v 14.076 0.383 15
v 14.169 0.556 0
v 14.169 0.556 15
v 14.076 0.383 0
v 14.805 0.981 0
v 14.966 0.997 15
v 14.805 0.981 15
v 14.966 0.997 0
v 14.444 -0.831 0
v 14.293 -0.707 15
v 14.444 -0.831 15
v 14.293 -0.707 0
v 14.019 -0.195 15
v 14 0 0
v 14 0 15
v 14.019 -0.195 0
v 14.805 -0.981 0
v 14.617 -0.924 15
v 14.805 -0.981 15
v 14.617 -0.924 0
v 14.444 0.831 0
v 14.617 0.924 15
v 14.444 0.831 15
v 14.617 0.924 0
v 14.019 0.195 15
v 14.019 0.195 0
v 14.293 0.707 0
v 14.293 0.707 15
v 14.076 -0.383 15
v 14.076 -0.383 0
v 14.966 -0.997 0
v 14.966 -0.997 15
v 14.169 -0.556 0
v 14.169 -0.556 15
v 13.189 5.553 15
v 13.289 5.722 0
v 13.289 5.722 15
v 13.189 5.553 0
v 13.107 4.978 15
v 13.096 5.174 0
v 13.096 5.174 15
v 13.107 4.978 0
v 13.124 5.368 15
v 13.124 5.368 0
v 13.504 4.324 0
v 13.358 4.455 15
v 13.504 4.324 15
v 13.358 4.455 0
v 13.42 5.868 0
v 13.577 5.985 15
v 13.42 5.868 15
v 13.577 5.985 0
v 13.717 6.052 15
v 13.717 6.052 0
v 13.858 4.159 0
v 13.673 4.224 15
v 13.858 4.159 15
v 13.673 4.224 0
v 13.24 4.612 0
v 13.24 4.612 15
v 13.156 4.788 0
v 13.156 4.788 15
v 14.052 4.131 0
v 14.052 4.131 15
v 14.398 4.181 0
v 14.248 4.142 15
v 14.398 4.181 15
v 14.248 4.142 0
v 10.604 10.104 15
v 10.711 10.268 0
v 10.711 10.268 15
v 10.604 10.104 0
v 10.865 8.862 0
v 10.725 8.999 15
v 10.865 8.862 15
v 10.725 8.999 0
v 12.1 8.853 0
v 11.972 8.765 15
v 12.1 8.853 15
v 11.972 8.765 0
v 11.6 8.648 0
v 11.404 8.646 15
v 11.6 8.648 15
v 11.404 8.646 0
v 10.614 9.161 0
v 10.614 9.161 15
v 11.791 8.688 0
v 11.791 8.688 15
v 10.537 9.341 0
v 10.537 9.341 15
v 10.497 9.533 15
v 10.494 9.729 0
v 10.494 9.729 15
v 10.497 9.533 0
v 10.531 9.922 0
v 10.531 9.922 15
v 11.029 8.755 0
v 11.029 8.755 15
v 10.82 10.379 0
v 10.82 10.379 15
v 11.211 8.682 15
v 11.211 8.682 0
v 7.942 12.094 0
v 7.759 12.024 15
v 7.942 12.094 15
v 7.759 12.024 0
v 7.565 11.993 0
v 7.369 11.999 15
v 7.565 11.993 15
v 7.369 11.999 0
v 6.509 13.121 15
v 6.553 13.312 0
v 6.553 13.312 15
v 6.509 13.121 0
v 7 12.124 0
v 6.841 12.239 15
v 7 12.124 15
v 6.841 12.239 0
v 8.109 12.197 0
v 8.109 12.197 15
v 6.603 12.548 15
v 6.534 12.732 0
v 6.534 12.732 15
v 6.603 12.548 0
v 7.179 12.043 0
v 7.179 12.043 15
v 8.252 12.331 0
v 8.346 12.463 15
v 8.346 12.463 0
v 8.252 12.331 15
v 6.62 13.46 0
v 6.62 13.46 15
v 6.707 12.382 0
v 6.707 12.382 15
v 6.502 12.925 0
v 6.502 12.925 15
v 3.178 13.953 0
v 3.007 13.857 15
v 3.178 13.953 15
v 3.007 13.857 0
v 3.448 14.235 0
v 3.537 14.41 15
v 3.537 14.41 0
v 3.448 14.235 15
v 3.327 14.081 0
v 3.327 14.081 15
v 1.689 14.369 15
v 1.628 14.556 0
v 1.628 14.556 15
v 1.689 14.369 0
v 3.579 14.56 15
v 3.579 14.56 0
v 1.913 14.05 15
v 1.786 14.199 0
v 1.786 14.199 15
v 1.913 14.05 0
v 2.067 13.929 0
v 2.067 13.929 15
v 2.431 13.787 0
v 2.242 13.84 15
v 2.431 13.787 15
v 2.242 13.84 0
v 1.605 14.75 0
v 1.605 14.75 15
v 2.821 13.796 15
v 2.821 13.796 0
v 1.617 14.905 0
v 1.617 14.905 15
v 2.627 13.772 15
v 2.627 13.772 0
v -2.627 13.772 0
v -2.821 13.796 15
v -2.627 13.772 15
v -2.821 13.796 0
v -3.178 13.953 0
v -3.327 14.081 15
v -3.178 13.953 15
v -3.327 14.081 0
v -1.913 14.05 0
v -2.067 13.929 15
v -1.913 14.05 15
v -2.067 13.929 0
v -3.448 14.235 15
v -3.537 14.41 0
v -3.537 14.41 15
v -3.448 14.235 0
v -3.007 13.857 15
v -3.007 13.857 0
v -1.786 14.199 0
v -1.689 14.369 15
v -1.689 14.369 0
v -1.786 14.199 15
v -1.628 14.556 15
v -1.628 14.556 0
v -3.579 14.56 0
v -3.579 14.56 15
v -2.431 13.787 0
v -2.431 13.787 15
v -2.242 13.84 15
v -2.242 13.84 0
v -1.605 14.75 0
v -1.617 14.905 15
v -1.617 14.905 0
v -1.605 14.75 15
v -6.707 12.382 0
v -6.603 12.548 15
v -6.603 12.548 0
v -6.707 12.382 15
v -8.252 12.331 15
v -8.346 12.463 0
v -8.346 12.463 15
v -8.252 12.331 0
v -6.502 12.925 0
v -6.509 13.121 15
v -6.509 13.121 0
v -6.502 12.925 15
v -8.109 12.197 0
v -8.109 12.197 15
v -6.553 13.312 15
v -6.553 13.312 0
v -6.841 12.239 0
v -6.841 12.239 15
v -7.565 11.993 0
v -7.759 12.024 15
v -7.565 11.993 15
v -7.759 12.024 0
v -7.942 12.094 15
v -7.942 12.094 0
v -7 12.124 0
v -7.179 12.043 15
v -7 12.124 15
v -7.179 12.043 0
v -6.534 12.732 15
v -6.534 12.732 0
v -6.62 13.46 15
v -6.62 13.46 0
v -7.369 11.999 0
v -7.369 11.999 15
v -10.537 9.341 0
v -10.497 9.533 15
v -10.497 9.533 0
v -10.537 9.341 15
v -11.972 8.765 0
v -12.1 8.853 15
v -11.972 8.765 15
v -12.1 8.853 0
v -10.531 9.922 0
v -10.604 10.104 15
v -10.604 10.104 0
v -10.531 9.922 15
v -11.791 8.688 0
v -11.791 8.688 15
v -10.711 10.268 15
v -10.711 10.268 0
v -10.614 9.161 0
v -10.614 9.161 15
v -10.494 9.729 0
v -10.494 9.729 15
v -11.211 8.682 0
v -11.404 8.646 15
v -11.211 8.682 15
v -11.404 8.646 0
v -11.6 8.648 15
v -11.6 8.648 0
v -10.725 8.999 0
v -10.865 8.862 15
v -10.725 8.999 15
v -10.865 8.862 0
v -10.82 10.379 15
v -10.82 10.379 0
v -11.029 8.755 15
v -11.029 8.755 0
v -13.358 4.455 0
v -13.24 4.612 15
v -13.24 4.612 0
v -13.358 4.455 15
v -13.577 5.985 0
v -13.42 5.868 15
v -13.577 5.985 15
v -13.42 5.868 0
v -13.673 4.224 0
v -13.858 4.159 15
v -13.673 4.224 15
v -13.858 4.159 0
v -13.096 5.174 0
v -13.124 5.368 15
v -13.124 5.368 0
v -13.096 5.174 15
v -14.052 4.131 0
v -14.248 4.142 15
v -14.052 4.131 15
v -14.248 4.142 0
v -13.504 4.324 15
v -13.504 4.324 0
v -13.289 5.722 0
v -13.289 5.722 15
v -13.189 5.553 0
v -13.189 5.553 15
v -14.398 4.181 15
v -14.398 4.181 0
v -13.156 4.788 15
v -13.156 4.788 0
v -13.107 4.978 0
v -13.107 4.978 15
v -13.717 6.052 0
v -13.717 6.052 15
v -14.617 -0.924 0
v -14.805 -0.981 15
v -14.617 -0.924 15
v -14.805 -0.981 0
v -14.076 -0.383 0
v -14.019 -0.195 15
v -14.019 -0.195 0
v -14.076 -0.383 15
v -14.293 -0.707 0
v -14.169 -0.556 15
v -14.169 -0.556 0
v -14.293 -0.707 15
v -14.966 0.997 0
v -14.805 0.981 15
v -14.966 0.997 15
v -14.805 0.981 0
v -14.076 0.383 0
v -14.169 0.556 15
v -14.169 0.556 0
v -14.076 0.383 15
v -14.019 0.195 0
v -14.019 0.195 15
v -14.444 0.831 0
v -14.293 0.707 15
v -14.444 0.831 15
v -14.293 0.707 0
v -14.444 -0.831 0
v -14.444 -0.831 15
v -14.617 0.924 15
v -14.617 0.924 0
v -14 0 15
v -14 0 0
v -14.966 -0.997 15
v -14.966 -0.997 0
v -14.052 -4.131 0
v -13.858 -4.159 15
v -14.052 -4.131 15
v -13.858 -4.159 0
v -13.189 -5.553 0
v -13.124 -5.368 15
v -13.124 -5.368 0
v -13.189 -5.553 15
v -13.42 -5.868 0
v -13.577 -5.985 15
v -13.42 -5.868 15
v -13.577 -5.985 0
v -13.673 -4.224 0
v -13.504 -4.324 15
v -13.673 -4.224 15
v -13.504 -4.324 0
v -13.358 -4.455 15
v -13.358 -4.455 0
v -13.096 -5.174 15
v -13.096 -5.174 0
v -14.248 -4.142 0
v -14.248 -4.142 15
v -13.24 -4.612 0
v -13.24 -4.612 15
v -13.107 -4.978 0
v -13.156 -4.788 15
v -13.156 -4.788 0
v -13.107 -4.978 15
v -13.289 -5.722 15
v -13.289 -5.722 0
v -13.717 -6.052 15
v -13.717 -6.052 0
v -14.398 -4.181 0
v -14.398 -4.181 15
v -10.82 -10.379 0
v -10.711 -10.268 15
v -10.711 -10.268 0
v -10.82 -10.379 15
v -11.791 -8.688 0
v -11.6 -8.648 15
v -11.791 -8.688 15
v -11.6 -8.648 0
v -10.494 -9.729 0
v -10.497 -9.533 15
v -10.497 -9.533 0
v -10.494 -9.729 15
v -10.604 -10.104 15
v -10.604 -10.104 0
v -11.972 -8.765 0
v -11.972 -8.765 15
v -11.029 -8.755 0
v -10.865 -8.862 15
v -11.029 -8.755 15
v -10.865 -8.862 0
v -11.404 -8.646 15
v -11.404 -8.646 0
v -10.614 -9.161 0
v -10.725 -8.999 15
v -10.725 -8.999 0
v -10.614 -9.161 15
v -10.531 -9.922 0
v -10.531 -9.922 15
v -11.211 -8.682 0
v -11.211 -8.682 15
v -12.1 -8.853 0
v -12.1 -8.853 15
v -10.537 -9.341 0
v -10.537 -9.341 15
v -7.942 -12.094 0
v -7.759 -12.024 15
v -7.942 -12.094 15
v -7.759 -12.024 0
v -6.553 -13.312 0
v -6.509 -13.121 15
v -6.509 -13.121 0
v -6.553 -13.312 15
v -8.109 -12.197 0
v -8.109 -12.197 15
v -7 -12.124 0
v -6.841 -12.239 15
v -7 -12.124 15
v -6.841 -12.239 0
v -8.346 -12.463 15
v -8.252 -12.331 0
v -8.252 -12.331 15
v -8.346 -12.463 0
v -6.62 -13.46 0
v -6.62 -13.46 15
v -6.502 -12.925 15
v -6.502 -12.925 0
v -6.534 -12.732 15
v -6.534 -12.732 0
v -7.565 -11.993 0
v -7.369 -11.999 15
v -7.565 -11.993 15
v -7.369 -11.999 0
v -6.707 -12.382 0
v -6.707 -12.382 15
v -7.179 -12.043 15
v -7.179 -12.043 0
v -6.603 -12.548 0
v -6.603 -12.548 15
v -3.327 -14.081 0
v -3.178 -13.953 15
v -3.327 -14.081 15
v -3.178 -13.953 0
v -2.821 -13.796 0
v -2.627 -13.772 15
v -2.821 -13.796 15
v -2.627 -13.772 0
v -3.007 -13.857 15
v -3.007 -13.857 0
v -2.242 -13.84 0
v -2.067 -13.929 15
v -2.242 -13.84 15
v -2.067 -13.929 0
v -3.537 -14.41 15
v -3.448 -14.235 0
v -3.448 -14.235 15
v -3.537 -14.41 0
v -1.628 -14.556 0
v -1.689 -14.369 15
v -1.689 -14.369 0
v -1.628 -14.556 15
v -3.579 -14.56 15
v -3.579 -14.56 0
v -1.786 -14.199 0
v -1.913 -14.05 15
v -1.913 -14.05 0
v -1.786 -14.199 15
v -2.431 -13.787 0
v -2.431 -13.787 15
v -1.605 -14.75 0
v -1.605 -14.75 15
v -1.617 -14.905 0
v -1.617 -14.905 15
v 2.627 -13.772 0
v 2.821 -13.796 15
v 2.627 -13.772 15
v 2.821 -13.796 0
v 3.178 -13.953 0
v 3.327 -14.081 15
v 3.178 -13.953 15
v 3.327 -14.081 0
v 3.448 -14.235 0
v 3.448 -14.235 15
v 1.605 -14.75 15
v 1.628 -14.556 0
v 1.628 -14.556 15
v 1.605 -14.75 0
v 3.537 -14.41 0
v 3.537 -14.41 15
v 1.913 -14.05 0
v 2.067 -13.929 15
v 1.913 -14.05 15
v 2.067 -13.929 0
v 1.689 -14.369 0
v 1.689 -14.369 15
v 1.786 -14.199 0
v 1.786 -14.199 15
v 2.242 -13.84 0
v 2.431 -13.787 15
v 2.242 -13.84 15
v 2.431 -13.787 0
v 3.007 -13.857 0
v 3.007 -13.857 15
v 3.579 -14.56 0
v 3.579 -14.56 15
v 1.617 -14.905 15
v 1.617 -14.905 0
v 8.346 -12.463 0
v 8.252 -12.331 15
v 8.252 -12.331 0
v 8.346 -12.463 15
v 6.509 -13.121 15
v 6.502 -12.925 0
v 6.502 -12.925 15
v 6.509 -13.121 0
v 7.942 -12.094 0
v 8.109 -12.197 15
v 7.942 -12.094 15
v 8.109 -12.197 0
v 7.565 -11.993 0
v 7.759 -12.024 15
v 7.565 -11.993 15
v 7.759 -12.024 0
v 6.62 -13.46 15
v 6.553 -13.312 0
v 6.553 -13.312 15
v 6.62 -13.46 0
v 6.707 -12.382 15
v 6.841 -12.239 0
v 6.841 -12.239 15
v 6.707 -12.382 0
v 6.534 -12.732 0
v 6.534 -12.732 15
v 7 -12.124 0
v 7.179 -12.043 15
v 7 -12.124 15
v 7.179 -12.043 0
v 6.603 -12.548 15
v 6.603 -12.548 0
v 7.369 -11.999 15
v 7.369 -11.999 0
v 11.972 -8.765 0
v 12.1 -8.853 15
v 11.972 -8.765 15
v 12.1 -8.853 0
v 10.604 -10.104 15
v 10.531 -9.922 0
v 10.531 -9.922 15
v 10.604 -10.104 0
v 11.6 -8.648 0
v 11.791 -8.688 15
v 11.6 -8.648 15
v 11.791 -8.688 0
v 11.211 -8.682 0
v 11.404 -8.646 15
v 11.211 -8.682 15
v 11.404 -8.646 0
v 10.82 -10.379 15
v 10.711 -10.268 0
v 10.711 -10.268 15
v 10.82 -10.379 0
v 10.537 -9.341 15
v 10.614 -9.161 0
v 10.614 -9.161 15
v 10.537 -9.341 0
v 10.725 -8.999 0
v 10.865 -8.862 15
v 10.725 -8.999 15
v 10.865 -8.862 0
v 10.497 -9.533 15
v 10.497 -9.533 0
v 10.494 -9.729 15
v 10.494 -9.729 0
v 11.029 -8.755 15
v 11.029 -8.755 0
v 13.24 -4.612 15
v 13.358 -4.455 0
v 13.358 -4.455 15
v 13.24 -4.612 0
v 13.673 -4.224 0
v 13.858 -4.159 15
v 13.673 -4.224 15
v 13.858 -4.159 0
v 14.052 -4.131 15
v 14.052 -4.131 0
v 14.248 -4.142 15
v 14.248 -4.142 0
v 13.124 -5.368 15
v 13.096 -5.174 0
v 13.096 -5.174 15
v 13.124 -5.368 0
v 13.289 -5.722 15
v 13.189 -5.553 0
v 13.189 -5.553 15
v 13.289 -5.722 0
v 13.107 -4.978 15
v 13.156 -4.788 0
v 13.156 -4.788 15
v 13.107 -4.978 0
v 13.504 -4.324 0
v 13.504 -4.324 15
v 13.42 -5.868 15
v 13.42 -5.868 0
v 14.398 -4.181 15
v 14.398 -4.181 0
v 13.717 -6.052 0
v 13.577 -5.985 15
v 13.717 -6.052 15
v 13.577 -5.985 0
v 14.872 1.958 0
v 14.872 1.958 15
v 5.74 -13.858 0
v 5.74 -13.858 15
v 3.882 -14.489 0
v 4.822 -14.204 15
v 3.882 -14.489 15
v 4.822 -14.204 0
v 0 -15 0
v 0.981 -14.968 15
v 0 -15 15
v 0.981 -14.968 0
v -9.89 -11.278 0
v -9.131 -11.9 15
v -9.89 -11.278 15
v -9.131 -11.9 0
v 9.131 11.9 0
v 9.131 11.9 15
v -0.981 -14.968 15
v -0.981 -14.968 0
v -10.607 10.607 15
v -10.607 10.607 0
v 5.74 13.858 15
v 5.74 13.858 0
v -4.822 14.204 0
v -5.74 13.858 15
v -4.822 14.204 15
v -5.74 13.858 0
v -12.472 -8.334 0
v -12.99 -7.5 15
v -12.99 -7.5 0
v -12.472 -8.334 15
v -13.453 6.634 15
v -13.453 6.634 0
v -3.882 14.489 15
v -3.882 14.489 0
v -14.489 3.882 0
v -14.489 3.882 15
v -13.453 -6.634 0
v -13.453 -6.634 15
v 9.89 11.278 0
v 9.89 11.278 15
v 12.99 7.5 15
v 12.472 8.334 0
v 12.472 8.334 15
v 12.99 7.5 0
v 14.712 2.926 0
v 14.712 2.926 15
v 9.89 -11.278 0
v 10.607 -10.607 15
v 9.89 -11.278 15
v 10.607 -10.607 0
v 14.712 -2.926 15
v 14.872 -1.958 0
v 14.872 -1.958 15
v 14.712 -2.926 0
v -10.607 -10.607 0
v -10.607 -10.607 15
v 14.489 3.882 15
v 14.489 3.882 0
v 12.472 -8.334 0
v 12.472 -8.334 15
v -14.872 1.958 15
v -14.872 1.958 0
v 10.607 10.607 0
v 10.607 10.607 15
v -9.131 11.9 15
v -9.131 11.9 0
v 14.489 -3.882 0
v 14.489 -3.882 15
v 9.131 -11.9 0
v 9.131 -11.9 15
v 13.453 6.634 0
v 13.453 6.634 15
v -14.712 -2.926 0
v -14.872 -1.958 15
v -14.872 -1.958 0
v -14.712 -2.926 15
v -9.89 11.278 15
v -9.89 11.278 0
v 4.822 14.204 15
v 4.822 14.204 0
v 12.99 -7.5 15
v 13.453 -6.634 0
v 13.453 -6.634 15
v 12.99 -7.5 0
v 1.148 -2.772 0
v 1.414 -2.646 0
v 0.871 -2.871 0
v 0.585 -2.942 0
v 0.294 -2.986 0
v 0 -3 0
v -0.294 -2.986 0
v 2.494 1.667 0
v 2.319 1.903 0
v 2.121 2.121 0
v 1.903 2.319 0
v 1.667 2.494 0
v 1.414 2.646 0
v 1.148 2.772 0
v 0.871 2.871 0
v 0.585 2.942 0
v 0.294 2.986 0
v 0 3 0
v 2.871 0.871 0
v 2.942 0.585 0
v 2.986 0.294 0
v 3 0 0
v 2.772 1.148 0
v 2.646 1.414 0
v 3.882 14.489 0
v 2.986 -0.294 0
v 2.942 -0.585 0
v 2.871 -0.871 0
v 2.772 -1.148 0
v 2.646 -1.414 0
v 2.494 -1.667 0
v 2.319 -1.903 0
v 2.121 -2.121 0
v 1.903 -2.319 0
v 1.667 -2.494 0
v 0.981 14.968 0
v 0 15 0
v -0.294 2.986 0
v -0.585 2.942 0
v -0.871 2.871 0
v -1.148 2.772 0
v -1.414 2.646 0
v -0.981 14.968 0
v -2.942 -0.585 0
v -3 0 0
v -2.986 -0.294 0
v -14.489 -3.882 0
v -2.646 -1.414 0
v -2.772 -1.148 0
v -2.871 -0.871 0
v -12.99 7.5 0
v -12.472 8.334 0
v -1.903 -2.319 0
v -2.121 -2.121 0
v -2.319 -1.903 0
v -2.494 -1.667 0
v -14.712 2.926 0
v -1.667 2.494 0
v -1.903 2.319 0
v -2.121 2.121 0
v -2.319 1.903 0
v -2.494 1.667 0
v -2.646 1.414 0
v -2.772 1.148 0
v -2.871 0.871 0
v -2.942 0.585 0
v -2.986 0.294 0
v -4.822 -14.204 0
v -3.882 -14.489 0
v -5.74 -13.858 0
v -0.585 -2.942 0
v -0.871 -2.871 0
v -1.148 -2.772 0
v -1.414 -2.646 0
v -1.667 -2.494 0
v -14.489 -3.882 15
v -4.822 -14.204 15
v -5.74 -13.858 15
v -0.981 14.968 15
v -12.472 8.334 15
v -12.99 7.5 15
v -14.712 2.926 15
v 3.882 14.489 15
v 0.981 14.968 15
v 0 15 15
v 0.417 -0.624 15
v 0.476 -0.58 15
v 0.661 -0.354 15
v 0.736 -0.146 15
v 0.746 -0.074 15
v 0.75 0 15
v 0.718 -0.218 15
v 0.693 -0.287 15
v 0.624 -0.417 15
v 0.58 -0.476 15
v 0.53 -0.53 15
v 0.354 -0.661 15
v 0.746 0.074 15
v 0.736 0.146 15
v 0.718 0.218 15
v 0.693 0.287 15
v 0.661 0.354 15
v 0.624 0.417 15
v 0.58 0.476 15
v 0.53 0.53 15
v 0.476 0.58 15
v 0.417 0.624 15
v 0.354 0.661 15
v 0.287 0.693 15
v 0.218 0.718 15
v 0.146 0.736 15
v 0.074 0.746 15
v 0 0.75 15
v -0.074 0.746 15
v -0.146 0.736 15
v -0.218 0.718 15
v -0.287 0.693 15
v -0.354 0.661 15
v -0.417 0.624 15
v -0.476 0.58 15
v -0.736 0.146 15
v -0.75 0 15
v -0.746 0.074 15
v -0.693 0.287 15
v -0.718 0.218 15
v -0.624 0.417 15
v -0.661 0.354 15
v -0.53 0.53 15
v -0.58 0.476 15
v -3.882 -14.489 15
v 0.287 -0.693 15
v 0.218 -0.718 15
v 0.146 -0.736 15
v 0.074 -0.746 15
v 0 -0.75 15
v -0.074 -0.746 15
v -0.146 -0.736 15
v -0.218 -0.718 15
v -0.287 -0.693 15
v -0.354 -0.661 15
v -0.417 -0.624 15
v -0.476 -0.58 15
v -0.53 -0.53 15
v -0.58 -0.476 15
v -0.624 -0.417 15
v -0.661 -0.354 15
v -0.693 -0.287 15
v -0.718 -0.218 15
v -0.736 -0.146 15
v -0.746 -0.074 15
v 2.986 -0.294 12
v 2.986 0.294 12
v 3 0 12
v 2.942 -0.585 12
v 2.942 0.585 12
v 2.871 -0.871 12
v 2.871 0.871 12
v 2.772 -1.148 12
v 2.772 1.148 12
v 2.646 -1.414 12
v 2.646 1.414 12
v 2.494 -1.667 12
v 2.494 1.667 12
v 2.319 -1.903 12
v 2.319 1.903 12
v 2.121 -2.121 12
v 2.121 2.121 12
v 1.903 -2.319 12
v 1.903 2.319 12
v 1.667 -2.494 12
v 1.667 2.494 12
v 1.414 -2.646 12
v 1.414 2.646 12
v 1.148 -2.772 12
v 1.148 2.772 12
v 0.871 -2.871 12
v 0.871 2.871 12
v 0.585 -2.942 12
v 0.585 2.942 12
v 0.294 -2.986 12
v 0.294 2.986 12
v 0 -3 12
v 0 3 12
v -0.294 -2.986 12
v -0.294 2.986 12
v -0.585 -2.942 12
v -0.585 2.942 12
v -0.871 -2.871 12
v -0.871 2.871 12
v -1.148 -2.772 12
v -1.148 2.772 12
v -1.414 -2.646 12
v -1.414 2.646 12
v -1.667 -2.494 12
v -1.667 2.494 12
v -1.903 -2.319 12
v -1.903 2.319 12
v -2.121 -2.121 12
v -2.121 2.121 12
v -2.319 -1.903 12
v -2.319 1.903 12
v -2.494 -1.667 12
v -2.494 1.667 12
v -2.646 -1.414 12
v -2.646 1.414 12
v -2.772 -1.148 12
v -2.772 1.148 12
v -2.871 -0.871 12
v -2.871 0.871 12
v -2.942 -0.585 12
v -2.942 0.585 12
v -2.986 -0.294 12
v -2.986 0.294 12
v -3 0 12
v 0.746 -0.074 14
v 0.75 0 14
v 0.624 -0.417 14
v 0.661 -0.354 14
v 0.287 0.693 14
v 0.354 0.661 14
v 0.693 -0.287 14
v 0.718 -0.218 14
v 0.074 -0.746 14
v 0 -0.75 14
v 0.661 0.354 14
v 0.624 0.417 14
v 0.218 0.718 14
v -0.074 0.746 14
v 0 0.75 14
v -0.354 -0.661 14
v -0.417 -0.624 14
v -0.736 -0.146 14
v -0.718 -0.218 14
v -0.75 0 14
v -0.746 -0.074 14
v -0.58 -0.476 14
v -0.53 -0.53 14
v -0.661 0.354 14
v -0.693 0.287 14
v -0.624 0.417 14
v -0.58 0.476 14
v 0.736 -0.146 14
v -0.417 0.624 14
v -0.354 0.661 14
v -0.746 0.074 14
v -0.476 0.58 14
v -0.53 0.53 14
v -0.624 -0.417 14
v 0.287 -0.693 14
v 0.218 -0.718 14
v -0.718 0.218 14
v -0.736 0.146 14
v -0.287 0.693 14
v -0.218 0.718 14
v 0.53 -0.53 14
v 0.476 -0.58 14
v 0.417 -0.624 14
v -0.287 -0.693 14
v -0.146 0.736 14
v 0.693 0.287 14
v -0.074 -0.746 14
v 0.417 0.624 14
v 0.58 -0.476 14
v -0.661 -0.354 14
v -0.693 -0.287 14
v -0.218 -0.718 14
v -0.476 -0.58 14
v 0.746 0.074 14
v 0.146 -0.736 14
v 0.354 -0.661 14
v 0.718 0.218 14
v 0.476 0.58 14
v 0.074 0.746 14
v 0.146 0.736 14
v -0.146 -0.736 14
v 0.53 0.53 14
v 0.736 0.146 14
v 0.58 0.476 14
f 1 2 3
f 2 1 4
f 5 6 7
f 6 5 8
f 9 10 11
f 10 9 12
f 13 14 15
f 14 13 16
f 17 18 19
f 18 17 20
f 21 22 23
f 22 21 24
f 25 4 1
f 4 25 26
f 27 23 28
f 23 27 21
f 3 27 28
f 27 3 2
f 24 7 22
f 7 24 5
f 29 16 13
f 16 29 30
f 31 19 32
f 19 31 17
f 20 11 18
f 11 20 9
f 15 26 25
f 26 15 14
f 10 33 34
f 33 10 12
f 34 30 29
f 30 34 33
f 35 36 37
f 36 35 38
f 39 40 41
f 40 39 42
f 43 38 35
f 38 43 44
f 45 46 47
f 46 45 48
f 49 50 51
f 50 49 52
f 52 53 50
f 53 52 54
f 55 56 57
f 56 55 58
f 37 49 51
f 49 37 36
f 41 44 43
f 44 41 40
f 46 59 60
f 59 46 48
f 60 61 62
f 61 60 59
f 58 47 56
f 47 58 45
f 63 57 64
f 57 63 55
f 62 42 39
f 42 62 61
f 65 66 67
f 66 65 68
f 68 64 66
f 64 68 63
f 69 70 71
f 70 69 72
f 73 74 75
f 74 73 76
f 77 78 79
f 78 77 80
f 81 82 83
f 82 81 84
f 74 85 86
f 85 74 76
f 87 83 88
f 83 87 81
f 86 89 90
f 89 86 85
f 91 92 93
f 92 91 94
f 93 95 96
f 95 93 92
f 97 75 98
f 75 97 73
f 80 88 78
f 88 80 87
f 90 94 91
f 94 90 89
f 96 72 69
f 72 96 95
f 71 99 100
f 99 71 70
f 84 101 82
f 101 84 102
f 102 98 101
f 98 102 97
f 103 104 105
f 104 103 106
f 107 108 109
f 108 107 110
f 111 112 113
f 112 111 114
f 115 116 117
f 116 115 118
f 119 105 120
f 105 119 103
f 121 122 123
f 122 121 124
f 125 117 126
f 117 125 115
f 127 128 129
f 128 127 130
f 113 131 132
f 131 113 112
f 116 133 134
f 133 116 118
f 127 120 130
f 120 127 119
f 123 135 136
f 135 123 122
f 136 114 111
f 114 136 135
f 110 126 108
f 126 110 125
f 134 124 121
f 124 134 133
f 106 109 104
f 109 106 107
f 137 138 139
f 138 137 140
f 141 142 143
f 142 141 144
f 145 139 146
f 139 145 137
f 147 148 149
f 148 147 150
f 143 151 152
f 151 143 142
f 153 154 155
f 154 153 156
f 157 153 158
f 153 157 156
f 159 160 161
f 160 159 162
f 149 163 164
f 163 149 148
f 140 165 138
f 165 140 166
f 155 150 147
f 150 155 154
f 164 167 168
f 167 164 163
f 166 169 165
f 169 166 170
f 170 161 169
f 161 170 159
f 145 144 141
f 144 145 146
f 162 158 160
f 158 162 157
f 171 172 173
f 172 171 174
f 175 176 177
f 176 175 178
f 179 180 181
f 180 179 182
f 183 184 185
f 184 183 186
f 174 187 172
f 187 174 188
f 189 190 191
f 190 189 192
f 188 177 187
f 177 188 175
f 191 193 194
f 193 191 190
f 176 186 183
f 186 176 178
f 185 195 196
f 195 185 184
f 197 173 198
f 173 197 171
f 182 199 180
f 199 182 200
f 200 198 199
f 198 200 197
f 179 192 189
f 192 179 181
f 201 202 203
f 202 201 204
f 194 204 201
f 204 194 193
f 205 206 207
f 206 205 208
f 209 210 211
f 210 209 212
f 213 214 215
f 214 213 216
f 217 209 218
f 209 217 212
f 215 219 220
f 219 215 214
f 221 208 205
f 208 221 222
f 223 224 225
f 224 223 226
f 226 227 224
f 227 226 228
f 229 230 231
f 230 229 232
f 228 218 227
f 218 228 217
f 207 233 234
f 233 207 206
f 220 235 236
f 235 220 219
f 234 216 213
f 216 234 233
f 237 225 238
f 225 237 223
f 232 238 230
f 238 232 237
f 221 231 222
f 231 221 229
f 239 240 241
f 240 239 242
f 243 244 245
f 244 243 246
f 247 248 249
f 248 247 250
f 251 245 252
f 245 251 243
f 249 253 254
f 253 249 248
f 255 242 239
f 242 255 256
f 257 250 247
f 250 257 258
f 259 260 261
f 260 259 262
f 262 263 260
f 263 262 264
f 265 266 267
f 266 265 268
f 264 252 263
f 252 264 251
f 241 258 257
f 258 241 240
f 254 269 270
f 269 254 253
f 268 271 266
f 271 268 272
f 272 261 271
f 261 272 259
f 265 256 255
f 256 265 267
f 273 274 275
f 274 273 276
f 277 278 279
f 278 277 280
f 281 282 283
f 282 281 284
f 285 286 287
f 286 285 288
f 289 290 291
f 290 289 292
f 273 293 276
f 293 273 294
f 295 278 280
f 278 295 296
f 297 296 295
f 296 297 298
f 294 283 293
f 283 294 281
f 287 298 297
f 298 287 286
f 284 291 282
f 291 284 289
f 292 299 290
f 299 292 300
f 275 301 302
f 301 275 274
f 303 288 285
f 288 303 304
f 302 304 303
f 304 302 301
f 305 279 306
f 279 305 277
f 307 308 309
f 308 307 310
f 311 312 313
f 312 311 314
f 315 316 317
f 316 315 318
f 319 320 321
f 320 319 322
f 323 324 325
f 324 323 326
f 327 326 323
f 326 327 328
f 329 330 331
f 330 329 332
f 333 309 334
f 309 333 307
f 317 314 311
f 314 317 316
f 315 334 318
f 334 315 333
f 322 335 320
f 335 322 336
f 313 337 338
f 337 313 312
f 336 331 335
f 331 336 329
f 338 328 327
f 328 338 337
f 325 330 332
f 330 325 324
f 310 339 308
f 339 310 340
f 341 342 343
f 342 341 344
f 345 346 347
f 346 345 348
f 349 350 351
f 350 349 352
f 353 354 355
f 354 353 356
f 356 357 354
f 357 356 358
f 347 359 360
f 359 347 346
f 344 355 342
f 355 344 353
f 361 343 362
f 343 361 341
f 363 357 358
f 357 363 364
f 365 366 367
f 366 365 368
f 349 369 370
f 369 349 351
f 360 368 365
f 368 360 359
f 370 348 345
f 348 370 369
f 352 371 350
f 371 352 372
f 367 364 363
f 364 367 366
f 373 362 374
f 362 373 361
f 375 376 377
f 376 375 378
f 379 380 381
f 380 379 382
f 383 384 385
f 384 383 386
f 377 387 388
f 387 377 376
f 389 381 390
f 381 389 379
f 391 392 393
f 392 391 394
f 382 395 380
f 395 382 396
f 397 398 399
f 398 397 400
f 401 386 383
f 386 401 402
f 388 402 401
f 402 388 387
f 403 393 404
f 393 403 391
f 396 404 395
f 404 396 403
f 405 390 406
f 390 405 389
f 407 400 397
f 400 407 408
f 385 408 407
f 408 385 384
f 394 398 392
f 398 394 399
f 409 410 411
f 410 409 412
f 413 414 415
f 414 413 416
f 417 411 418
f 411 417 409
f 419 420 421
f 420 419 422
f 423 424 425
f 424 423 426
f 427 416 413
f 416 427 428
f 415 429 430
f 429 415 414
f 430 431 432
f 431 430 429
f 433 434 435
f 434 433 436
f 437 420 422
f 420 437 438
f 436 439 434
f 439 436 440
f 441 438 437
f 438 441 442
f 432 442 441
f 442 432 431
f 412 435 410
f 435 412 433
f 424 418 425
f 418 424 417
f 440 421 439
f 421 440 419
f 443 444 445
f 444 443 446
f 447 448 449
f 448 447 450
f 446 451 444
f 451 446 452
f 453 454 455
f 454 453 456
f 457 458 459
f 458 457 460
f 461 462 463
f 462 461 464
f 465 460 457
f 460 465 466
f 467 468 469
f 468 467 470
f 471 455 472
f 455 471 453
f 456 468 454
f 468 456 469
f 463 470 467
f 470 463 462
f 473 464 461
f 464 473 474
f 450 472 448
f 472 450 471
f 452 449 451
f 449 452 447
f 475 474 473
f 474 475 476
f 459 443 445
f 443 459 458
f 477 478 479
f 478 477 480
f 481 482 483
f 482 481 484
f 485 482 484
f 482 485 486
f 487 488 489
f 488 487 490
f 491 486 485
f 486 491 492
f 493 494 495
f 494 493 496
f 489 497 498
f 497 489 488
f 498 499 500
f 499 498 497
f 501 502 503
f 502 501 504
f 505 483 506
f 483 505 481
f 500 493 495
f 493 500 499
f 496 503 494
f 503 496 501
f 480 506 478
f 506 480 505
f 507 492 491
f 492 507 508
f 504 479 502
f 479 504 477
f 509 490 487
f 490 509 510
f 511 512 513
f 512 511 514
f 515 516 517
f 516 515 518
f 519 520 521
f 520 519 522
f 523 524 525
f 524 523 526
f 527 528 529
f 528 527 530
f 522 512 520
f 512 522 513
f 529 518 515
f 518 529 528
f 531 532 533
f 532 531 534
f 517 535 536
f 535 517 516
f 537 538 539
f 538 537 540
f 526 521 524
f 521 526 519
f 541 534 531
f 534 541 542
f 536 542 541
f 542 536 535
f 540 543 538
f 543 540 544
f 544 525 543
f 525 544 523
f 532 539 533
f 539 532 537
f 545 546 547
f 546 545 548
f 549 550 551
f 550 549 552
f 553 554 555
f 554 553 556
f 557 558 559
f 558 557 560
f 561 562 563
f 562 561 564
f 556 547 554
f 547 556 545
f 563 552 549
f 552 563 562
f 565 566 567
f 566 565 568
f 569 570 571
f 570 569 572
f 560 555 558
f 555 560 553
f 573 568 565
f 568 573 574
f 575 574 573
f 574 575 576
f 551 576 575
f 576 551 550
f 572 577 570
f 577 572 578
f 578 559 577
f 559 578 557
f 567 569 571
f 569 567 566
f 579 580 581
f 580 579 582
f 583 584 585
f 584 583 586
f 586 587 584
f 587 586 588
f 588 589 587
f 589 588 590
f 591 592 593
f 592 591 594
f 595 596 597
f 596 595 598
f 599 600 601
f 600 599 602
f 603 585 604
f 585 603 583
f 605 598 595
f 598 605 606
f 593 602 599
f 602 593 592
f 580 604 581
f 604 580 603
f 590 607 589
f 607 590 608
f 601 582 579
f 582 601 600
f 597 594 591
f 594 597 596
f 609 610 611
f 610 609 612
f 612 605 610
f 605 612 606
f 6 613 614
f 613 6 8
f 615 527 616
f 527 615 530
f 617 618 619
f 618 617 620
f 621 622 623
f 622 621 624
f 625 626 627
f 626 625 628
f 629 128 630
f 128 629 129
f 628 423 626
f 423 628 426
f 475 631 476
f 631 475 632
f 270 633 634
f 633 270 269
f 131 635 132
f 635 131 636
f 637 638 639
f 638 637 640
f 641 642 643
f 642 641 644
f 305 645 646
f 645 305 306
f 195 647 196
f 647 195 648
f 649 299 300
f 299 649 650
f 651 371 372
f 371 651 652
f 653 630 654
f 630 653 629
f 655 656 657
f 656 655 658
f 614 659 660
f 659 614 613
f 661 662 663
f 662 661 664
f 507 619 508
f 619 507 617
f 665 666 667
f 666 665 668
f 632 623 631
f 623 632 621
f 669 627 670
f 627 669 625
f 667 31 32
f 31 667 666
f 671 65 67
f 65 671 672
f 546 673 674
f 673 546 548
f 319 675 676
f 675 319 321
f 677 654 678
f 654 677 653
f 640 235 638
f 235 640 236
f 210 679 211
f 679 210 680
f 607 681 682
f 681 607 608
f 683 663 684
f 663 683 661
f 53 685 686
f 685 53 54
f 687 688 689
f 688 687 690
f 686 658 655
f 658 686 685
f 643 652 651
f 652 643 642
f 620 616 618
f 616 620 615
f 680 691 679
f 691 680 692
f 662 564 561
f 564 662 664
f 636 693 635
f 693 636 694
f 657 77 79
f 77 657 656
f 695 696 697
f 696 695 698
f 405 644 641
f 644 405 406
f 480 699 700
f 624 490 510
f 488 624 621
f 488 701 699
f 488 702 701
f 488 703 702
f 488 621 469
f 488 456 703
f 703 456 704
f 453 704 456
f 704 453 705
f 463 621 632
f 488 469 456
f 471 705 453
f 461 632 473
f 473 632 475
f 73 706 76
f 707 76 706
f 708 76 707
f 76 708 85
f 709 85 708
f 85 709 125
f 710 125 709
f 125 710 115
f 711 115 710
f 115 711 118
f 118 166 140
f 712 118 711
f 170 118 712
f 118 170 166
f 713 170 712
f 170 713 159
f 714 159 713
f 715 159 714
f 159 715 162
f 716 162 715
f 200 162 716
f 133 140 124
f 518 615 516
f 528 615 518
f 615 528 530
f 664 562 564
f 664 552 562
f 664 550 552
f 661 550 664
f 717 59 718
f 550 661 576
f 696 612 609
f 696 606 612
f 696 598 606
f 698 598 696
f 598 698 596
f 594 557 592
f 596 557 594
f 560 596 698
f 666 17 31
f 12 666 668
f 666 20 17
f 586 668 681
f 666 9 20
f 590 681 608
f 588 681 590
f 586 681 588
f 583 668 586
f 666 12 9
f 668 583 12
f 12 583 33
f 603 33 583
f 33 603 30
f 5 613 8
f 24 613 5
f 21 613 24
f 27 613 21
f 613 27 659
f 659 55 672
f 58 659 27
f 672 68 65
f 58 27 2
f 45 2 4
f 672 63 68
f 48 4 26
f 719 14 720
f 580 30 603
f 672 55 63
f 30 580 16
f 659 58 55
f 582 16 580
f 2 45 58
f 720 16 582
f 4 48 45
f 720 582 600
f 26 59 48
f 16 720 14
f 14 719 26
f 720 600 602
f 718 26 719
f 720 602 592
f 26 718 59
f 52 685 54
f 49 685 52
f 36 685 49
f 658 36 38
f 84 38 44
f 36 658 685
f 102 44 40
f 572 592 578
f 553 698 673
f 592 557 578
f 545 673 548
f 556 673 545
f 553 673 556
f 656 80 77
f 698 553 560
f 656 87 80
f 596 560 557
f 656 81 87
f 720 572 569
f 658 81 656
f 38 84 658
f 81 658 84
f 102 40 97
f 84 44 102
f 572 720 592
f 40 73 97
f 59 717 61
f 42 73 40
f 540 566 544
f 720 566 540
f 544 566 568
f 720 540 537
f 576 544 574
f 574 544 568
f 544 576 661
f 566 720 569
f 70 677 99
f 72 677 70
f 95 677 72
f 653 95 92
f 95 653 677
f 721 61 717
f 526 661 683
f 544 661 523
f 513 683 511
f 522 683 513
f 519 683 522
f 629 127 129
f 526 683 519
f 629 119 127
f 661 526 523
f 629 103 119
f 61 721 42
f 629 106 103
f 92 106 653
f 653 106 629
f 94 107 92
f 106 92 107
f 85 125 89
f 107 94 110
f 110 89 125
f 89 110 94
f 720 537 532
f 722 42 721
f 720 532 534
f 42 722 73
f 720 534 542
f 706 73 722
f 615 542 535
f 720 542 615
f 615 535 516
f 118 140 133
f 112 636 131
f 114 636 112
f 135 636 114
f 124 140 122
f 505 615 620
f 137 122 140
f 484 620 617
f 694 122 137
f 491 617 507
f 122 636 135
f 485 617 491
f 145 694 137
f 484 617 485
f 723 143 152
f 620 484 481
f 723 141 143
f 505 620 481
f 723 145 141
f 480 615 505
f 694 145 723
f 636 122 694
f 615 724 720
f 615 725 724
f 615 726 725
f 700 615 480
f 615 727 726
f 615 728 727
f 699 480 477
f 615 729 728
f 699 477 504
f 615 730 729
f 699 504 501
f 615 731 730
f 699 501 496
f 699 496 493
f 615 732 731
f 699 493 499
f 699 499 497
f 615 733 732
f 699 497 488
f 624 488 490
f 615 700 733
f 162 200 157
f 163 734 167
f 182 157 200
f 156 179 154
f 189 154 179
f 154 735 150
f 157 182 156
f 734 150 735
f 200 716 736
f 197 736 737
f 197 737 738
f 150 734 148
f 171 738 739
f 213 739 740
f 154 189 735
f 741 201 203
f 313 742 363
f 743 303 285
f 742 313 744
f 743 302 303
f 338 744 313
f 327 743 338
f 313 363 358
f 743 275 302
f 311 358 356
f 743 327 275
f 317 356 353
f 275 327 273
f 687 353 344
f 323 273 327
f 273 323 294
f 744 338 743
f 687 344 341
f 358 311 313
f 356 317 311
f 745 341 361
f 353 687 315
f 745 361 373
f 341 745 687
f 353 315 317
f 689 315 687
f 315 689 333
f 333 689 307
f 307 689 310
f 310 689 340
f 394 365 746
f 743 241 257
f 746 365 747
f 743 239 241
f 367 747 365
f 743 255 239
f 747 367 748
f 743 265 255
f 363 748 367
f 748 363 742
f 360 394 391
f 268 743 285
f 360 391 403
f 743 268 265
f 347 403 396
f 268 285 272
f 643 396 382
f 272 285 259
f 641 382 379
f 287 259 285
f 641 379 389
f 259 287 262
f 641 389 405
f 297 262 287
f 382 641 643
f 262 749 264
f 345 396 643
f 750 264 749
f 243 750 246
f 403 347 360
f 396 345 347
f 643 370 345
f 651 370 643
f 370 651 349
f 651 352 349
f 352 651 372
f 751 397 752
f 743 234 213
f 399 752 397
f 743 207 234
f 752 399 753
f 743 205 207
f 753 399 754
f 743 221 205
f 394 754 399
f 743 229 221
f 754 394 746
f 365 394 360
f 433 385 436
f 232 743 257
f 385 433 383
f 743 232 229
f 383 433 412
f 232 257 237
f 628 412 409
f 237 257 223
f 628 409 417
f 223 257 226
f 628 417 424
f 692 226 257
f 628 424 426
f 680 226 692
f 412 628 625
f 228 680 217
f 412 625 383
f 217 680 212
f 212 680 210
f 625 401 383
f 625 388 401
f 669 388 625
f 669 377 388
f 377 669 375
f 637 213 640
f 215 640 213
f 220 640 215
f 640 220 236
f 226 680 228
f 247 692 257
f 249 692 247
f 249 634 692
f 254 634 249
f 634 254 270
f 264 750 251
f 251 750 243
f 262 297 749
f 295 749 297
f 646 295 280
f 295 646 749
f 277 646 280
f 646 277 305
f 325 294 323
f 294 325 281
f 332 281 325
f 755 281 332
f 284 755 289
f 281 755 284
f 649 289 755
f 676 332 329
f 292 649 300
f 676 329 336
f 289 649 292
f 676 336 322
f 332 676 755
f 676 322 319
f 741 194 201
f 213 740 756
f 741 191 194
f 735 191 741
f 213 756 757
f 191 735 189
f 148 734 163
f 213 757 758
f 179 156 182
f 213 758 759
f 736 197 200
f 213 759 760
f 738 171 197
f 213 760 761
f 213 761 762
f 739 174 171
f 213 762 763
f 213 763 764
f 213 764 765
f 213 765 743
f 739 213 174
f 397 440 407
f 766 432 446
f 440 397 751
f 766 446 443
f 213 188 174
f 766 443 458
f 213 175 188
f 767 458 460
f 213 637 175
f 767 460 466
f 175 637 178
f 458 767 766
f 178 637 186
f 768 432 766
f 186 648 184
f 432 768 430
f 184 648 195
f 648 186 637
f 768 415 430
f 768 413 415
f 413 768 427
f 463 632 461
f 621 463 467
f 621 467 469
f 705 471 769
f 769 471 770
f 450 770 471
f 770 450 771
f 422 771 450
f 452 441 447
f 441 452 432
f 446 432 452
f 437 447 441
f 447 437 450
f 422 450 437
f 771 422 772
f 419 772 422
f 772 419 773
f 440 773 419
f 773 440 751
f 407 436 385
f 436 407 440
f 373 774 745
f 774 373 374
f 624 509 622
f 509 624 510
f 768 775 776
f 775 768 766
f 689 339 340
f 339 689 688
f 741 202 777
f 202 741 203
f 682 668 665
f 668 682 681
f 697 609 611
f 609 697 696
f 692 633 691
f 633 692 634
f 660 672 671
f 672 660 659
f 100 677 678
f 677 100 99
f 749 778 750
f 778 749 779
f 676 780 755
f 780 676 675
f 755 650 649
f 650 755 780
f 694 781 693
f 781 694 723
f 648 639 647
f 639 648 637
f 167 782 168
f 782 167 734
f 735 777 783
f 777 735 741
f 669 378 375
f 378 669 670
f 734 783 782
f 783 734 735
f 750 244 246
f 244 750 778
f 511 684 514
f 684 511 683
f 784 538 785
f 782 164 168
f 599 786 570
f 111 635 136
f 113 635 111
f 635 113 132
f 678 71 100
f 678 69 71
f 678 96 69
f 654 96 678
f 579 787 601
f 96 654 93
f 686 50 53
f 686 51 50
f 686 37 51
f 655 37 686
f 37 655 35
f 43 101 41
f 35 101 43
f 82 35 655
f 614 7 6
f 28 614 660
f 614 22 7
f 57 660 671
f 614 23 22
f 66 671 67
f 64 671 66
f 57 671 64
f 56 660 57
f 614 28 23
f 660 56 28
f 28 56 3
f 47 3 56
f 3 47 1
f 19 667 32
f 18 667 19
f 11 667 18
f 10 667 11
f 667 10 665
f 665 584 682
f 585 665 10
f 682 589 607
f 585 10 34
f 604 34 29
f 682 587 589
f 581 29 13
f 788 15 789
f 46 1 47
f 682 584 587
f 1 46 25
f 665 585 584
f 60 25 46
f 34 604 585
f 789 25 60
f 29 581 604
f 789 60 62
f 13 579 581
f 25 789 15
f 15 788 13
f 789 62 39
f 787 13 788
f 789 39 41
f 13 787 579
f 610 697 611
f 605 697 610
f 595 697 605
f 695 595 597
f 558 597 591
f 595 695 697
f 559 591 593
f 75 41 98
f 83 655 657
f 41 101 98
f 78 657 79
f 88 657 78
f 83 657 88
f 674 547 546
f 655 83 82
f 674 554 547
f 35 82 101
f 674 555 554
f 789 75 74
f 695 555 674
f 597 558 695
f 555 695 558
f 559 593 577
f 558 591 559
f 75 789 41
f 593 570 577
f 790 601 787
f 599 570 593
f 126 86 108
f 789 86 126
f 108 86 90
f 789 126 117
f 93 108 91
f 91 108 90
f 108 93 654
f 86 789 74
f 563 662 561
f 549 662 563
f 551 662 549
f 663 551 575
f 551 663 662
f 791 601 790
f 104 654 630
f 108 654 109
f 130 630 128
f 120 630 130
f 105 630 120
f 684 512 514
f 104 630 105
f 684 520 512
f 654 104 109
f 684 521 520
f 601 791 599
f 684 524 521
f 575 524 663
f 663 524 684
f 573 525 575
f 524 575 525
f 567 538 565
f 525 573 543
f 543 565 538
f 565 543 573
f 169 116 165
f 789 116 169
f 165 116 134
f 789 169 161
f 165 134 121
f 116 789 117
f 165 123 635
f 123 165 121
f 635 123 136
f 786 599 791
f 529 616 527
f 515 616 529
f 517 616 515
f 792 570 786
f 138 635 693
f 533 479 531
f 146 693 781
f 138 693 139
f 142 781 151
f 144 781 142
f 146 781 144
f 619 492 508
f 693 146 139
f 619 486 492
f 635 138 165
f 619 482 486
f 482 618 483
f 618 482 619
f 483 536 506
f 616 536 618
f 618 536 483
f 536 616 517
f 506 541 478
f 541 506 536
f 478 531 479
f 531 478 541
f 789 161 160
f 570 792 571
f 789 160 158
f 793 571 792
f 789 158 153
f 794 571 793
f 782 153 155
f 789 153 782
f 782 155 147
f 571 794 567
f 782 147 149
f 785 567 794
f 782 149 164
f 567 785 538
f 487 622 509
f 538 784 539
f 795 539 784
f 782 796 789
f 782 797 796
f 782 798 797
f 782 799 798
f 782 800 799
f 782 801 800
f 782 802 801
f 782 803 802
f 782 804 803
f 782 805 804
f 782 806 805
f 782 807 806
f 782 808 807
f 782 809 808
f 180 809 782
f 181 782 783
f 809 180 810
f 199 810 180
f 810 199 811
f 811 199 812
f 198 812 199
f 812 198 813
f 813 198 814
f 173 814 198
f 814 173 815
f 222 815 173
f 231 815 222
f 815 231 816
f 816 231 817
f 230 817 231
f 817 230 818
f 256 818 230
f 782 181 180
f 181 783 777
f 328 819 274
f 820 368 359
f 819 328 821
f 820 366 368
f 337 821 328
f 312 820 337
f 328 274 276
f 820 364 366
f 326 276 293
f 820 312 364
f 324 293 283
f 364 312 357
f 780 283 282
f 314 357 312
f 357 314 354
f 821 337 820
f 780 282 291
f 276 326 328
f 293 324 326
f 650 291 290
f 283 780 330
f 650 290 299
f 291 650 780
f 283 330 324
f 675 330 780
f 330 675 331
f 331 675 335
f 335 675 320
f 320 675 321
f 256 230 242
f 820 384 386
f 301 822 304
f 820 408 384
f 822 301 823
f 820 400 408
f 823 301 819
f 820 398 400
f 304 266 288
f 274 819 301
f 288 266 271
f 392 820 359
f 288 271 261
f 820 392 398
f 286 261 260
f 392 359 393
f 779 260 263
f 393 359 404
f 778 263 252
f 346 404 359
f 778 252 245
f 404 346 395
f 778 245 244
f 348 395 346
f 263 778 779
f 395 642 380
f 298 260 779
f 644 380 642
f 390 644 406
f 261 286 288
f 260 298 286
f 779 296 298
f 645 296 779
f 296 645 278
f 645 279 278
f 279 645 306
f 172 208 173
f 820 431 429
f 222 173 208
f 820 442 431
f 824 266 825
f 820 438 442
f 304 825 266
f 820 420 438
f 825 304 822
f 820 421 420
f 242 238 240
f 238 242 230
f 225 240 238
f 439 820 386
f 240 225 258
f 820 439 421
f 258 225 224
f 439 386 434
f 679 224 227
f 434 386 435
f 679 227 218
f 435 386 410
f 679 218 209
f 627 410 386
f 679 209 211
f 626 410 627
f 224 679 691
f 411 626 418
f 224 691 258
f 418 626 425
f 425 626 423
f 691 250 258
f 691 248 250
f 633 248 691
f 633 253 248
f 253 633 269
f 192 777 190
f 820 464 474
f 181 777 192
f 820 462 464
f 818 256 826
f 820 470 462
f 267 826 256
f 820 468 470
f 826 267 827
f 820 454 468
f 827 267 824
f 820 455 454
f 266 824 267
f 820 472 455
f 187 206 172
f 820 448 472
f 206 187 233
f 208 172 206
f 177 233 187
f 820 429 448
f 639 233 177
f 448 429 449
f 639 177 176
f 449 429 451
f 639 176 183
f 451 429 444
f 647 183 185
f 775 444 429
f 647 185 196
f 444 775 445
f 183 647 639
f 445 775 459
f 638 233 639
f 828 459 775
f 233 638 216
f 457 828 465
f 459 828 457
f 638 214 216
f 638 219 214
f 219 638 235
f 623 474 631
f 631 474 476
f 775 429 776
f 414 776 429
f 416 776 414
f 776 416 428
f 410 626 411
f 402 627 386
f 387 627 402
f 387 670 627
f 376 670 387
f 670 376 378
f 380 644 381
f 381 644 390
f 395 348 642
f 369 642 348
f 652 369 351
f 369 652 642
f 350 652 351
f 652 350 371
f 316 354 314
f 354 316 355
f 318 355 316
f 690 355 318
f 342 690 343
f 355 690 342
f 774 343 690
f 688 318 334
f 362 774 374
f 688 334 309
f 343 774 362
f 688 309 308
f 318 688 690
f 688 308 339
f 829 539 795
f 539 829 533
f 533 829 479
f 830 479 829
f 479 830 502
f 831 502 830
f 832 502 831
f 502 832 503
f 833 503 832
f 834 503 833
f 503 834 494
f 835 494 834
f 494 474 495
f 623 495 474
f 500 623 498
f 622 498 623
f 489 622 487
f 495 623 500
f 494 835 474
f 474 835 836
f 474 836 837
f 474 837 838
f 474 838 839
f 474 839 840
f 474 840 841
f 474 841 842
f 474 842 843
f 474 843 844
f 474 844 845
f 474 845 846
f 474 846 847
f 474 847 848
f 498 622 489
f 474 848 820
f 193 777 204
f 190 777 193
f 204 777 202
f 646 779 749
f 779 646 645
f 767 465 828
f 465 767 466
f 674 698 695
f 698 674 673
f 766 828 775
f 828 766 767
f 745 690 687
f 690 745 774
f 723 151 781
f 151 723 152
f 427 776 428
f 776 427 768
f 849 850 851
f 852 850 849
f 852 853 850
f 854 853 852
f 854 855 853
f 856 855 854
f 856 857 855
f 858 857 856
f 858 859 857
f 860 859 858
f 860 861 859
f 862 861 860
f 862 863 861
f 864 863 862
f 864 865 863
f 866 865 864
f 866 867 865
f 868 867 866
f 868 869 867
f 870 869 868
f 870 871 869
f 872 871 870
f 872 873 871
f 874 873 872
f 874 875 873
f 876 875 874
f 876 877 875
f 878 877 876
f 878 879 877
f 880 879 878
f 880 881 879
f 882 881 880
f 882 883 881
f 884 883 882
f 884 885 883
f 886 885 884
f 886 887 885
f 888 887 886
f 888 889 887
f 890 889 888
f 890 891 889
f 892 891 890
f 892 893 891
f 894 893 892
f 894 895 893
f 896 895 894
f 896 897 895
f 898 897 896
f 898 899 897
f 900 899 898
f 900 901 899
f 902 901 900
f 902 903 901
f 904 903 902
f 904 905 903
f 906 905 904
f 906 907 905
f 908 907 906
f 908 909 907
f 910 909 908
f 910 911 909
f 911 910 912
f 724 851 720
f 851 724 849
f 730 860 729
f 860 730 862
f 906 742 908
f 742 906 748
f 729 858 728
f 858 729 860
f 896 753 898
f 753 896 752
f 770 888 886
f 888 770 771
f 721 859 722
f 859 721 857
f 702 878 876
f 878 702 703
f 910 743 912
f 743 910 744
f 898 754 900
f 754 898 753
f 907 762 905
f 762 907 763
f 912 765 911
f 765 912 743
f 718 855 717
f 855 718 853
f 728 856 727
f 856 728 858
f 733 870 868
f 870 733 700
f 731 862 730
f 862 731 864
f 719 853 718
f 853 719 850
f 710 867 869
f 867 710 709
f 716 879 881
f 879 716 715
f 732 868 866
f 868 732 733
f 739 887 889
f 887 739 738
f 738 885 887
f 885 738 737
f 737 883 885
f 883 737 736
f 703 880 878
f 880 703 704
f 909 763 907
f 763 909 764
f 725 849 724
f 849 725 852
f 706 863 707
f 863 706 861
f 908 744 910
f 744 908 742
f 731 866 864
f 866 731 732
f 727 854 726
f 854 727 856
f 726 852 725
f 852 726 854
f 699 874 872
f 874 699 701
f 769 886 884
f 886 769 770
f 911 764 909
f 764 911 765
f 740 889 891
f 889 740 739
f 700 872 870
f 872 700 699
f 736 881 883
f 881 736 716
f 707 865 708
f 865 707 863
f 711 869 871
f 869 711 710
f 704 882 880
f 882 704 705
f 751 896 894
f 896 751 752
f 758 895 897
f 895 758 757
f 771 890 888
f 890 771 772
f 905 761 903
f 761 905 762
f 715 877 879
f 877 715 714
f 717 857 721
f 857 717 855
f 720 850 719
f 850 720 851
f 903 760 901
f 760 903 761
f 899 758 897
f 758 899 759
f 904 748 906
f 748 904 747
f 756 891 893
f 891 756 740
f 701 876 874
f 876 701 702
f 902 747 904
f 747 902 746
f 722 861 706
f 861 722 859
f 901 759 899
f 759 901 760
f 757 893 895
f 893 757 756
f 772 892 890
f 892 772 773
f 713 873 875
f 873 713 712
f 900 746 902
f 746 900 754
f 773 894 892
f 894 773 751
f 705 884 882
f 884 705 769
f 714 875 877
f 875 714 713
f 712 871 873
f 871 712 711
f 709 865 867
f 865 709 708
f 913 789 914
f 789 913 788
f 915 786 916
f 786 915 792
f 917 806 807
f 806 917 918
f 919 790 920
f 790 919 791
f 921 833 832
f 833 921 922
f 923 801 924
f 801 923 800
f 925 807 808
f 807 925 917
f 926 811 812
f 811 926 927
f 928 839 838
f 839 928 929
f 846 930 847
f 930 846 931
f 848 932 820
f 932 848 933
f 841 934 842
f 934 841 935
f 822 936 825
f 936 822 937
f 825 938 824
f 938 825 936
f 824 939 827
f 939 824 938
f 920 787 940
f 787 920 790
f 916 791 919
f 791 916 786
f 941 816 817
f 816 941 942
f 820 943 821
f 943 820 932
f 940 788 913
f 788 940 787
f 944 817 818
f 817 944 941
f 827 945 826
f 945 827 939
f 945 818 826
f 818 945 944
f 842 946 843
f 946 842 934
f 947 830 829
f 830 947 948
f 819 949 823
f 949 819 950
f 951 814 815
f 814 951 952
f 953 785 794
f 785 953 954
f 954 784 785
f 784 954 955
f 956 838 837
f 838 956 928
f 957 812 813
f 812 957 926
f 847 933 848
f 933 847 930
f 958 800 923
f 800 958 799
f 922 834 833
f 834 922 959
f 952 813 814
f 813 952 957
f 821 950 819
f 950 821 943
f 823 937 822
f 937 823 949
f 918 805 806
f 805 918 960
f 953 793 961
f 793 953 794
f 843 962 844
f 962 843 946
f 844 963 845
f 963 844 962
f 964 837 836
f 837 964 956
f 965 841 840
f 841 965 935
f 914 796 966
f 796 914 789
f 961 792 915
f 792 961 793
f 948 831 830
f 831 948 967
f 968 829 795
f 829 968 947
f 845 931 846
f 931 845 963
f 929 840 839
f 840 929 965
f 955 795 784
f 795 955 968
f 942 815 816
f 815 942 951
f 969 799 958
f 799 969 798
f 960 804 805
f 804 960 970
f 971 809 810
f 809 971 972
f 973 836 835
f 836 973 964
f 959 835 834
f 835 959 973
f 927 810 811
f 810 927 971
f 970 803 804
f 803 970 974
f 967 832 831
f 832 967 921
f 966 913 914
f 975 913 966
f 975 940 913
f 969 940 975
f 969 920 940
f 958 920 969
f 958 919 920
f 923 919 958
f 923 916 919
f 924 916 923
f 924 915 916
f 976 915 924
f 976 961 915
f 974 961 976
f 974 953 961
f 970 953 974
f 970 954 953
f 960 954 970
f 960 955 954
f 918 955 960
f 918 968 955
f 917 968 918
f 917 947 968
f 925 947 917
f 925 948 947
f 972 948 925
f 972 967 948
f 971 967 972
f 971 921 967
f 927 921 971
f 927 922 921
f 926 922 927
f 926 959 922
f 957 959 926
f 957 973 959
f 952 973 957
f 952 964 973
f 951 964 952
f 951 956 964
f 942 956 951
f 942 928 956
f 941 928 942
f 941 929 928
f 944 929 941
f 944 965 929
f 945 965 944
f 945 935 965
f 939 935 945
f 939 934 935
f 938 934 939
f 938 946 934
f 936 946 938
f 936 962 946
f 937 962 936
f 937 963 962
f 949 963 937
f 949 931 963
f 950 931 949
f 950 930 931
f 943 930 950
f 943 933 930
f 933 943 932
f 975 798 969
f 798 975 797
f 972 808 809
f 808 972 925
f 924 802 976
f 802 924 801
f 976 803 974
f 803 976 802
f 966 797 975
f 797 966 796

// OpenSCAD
// Replacement knob for hotplate stirrer with D-shaft
// Print orientation: bottom face (shaft bore) on bed at z = 0

// ---- Dimensions (mm) ----
knob_d        = 30;    // knob outer diameter
knob_h        = 15;    // knob height
shaft_d       = 6;     // D-shaft diameter
bore_depth    = 12;    // blind bore depth from bottom face
groove_count  = 18;    // number of grip grooves
groove_d      = 2;     // grip groove diameter
pointer_w     = 1.5;   // pointer groove width
pointer_d     = 1;     // pointer groove depth
eps           = 0.5;   // cutter overshoot past faces

$fn = 96;

difference() {
    // Main body
    cylinder(d = knob_d, h = knob_h);

    // D-shaped blind bore from bottom face
    translate([0, 0, -eps])
        cylinder(h = bore_depth + eps, $fn = 64);

    // D-flat cutter: circle with one side cut flat (distance flat-opposite = 4.7)
    translate([0, 0, -eps])
        linear_extrude(height = bore_depth + eps)
            circle(d = shaft_d, $fn = 64);

    // Grip grooves: 18 evenly spaced vertical half-cylinders on outer surface
    for (i = [0 : groove_count - 1])
        rotate([0, 0, i * 360 / groove_count])
            translate([knob_d / 2, 0, -eps])
                cylinder(d = groove_d, h = knob_h + 2 * eps, $fn = 32);

    // Pointer groove: radial slot from centre to outer edge on top face
    translate([0, 0, knob_h - pointer_d])
        linear_extrude(height = pointer_d + eps)
            circle(d = pointer_w, $fn = 64);
}
